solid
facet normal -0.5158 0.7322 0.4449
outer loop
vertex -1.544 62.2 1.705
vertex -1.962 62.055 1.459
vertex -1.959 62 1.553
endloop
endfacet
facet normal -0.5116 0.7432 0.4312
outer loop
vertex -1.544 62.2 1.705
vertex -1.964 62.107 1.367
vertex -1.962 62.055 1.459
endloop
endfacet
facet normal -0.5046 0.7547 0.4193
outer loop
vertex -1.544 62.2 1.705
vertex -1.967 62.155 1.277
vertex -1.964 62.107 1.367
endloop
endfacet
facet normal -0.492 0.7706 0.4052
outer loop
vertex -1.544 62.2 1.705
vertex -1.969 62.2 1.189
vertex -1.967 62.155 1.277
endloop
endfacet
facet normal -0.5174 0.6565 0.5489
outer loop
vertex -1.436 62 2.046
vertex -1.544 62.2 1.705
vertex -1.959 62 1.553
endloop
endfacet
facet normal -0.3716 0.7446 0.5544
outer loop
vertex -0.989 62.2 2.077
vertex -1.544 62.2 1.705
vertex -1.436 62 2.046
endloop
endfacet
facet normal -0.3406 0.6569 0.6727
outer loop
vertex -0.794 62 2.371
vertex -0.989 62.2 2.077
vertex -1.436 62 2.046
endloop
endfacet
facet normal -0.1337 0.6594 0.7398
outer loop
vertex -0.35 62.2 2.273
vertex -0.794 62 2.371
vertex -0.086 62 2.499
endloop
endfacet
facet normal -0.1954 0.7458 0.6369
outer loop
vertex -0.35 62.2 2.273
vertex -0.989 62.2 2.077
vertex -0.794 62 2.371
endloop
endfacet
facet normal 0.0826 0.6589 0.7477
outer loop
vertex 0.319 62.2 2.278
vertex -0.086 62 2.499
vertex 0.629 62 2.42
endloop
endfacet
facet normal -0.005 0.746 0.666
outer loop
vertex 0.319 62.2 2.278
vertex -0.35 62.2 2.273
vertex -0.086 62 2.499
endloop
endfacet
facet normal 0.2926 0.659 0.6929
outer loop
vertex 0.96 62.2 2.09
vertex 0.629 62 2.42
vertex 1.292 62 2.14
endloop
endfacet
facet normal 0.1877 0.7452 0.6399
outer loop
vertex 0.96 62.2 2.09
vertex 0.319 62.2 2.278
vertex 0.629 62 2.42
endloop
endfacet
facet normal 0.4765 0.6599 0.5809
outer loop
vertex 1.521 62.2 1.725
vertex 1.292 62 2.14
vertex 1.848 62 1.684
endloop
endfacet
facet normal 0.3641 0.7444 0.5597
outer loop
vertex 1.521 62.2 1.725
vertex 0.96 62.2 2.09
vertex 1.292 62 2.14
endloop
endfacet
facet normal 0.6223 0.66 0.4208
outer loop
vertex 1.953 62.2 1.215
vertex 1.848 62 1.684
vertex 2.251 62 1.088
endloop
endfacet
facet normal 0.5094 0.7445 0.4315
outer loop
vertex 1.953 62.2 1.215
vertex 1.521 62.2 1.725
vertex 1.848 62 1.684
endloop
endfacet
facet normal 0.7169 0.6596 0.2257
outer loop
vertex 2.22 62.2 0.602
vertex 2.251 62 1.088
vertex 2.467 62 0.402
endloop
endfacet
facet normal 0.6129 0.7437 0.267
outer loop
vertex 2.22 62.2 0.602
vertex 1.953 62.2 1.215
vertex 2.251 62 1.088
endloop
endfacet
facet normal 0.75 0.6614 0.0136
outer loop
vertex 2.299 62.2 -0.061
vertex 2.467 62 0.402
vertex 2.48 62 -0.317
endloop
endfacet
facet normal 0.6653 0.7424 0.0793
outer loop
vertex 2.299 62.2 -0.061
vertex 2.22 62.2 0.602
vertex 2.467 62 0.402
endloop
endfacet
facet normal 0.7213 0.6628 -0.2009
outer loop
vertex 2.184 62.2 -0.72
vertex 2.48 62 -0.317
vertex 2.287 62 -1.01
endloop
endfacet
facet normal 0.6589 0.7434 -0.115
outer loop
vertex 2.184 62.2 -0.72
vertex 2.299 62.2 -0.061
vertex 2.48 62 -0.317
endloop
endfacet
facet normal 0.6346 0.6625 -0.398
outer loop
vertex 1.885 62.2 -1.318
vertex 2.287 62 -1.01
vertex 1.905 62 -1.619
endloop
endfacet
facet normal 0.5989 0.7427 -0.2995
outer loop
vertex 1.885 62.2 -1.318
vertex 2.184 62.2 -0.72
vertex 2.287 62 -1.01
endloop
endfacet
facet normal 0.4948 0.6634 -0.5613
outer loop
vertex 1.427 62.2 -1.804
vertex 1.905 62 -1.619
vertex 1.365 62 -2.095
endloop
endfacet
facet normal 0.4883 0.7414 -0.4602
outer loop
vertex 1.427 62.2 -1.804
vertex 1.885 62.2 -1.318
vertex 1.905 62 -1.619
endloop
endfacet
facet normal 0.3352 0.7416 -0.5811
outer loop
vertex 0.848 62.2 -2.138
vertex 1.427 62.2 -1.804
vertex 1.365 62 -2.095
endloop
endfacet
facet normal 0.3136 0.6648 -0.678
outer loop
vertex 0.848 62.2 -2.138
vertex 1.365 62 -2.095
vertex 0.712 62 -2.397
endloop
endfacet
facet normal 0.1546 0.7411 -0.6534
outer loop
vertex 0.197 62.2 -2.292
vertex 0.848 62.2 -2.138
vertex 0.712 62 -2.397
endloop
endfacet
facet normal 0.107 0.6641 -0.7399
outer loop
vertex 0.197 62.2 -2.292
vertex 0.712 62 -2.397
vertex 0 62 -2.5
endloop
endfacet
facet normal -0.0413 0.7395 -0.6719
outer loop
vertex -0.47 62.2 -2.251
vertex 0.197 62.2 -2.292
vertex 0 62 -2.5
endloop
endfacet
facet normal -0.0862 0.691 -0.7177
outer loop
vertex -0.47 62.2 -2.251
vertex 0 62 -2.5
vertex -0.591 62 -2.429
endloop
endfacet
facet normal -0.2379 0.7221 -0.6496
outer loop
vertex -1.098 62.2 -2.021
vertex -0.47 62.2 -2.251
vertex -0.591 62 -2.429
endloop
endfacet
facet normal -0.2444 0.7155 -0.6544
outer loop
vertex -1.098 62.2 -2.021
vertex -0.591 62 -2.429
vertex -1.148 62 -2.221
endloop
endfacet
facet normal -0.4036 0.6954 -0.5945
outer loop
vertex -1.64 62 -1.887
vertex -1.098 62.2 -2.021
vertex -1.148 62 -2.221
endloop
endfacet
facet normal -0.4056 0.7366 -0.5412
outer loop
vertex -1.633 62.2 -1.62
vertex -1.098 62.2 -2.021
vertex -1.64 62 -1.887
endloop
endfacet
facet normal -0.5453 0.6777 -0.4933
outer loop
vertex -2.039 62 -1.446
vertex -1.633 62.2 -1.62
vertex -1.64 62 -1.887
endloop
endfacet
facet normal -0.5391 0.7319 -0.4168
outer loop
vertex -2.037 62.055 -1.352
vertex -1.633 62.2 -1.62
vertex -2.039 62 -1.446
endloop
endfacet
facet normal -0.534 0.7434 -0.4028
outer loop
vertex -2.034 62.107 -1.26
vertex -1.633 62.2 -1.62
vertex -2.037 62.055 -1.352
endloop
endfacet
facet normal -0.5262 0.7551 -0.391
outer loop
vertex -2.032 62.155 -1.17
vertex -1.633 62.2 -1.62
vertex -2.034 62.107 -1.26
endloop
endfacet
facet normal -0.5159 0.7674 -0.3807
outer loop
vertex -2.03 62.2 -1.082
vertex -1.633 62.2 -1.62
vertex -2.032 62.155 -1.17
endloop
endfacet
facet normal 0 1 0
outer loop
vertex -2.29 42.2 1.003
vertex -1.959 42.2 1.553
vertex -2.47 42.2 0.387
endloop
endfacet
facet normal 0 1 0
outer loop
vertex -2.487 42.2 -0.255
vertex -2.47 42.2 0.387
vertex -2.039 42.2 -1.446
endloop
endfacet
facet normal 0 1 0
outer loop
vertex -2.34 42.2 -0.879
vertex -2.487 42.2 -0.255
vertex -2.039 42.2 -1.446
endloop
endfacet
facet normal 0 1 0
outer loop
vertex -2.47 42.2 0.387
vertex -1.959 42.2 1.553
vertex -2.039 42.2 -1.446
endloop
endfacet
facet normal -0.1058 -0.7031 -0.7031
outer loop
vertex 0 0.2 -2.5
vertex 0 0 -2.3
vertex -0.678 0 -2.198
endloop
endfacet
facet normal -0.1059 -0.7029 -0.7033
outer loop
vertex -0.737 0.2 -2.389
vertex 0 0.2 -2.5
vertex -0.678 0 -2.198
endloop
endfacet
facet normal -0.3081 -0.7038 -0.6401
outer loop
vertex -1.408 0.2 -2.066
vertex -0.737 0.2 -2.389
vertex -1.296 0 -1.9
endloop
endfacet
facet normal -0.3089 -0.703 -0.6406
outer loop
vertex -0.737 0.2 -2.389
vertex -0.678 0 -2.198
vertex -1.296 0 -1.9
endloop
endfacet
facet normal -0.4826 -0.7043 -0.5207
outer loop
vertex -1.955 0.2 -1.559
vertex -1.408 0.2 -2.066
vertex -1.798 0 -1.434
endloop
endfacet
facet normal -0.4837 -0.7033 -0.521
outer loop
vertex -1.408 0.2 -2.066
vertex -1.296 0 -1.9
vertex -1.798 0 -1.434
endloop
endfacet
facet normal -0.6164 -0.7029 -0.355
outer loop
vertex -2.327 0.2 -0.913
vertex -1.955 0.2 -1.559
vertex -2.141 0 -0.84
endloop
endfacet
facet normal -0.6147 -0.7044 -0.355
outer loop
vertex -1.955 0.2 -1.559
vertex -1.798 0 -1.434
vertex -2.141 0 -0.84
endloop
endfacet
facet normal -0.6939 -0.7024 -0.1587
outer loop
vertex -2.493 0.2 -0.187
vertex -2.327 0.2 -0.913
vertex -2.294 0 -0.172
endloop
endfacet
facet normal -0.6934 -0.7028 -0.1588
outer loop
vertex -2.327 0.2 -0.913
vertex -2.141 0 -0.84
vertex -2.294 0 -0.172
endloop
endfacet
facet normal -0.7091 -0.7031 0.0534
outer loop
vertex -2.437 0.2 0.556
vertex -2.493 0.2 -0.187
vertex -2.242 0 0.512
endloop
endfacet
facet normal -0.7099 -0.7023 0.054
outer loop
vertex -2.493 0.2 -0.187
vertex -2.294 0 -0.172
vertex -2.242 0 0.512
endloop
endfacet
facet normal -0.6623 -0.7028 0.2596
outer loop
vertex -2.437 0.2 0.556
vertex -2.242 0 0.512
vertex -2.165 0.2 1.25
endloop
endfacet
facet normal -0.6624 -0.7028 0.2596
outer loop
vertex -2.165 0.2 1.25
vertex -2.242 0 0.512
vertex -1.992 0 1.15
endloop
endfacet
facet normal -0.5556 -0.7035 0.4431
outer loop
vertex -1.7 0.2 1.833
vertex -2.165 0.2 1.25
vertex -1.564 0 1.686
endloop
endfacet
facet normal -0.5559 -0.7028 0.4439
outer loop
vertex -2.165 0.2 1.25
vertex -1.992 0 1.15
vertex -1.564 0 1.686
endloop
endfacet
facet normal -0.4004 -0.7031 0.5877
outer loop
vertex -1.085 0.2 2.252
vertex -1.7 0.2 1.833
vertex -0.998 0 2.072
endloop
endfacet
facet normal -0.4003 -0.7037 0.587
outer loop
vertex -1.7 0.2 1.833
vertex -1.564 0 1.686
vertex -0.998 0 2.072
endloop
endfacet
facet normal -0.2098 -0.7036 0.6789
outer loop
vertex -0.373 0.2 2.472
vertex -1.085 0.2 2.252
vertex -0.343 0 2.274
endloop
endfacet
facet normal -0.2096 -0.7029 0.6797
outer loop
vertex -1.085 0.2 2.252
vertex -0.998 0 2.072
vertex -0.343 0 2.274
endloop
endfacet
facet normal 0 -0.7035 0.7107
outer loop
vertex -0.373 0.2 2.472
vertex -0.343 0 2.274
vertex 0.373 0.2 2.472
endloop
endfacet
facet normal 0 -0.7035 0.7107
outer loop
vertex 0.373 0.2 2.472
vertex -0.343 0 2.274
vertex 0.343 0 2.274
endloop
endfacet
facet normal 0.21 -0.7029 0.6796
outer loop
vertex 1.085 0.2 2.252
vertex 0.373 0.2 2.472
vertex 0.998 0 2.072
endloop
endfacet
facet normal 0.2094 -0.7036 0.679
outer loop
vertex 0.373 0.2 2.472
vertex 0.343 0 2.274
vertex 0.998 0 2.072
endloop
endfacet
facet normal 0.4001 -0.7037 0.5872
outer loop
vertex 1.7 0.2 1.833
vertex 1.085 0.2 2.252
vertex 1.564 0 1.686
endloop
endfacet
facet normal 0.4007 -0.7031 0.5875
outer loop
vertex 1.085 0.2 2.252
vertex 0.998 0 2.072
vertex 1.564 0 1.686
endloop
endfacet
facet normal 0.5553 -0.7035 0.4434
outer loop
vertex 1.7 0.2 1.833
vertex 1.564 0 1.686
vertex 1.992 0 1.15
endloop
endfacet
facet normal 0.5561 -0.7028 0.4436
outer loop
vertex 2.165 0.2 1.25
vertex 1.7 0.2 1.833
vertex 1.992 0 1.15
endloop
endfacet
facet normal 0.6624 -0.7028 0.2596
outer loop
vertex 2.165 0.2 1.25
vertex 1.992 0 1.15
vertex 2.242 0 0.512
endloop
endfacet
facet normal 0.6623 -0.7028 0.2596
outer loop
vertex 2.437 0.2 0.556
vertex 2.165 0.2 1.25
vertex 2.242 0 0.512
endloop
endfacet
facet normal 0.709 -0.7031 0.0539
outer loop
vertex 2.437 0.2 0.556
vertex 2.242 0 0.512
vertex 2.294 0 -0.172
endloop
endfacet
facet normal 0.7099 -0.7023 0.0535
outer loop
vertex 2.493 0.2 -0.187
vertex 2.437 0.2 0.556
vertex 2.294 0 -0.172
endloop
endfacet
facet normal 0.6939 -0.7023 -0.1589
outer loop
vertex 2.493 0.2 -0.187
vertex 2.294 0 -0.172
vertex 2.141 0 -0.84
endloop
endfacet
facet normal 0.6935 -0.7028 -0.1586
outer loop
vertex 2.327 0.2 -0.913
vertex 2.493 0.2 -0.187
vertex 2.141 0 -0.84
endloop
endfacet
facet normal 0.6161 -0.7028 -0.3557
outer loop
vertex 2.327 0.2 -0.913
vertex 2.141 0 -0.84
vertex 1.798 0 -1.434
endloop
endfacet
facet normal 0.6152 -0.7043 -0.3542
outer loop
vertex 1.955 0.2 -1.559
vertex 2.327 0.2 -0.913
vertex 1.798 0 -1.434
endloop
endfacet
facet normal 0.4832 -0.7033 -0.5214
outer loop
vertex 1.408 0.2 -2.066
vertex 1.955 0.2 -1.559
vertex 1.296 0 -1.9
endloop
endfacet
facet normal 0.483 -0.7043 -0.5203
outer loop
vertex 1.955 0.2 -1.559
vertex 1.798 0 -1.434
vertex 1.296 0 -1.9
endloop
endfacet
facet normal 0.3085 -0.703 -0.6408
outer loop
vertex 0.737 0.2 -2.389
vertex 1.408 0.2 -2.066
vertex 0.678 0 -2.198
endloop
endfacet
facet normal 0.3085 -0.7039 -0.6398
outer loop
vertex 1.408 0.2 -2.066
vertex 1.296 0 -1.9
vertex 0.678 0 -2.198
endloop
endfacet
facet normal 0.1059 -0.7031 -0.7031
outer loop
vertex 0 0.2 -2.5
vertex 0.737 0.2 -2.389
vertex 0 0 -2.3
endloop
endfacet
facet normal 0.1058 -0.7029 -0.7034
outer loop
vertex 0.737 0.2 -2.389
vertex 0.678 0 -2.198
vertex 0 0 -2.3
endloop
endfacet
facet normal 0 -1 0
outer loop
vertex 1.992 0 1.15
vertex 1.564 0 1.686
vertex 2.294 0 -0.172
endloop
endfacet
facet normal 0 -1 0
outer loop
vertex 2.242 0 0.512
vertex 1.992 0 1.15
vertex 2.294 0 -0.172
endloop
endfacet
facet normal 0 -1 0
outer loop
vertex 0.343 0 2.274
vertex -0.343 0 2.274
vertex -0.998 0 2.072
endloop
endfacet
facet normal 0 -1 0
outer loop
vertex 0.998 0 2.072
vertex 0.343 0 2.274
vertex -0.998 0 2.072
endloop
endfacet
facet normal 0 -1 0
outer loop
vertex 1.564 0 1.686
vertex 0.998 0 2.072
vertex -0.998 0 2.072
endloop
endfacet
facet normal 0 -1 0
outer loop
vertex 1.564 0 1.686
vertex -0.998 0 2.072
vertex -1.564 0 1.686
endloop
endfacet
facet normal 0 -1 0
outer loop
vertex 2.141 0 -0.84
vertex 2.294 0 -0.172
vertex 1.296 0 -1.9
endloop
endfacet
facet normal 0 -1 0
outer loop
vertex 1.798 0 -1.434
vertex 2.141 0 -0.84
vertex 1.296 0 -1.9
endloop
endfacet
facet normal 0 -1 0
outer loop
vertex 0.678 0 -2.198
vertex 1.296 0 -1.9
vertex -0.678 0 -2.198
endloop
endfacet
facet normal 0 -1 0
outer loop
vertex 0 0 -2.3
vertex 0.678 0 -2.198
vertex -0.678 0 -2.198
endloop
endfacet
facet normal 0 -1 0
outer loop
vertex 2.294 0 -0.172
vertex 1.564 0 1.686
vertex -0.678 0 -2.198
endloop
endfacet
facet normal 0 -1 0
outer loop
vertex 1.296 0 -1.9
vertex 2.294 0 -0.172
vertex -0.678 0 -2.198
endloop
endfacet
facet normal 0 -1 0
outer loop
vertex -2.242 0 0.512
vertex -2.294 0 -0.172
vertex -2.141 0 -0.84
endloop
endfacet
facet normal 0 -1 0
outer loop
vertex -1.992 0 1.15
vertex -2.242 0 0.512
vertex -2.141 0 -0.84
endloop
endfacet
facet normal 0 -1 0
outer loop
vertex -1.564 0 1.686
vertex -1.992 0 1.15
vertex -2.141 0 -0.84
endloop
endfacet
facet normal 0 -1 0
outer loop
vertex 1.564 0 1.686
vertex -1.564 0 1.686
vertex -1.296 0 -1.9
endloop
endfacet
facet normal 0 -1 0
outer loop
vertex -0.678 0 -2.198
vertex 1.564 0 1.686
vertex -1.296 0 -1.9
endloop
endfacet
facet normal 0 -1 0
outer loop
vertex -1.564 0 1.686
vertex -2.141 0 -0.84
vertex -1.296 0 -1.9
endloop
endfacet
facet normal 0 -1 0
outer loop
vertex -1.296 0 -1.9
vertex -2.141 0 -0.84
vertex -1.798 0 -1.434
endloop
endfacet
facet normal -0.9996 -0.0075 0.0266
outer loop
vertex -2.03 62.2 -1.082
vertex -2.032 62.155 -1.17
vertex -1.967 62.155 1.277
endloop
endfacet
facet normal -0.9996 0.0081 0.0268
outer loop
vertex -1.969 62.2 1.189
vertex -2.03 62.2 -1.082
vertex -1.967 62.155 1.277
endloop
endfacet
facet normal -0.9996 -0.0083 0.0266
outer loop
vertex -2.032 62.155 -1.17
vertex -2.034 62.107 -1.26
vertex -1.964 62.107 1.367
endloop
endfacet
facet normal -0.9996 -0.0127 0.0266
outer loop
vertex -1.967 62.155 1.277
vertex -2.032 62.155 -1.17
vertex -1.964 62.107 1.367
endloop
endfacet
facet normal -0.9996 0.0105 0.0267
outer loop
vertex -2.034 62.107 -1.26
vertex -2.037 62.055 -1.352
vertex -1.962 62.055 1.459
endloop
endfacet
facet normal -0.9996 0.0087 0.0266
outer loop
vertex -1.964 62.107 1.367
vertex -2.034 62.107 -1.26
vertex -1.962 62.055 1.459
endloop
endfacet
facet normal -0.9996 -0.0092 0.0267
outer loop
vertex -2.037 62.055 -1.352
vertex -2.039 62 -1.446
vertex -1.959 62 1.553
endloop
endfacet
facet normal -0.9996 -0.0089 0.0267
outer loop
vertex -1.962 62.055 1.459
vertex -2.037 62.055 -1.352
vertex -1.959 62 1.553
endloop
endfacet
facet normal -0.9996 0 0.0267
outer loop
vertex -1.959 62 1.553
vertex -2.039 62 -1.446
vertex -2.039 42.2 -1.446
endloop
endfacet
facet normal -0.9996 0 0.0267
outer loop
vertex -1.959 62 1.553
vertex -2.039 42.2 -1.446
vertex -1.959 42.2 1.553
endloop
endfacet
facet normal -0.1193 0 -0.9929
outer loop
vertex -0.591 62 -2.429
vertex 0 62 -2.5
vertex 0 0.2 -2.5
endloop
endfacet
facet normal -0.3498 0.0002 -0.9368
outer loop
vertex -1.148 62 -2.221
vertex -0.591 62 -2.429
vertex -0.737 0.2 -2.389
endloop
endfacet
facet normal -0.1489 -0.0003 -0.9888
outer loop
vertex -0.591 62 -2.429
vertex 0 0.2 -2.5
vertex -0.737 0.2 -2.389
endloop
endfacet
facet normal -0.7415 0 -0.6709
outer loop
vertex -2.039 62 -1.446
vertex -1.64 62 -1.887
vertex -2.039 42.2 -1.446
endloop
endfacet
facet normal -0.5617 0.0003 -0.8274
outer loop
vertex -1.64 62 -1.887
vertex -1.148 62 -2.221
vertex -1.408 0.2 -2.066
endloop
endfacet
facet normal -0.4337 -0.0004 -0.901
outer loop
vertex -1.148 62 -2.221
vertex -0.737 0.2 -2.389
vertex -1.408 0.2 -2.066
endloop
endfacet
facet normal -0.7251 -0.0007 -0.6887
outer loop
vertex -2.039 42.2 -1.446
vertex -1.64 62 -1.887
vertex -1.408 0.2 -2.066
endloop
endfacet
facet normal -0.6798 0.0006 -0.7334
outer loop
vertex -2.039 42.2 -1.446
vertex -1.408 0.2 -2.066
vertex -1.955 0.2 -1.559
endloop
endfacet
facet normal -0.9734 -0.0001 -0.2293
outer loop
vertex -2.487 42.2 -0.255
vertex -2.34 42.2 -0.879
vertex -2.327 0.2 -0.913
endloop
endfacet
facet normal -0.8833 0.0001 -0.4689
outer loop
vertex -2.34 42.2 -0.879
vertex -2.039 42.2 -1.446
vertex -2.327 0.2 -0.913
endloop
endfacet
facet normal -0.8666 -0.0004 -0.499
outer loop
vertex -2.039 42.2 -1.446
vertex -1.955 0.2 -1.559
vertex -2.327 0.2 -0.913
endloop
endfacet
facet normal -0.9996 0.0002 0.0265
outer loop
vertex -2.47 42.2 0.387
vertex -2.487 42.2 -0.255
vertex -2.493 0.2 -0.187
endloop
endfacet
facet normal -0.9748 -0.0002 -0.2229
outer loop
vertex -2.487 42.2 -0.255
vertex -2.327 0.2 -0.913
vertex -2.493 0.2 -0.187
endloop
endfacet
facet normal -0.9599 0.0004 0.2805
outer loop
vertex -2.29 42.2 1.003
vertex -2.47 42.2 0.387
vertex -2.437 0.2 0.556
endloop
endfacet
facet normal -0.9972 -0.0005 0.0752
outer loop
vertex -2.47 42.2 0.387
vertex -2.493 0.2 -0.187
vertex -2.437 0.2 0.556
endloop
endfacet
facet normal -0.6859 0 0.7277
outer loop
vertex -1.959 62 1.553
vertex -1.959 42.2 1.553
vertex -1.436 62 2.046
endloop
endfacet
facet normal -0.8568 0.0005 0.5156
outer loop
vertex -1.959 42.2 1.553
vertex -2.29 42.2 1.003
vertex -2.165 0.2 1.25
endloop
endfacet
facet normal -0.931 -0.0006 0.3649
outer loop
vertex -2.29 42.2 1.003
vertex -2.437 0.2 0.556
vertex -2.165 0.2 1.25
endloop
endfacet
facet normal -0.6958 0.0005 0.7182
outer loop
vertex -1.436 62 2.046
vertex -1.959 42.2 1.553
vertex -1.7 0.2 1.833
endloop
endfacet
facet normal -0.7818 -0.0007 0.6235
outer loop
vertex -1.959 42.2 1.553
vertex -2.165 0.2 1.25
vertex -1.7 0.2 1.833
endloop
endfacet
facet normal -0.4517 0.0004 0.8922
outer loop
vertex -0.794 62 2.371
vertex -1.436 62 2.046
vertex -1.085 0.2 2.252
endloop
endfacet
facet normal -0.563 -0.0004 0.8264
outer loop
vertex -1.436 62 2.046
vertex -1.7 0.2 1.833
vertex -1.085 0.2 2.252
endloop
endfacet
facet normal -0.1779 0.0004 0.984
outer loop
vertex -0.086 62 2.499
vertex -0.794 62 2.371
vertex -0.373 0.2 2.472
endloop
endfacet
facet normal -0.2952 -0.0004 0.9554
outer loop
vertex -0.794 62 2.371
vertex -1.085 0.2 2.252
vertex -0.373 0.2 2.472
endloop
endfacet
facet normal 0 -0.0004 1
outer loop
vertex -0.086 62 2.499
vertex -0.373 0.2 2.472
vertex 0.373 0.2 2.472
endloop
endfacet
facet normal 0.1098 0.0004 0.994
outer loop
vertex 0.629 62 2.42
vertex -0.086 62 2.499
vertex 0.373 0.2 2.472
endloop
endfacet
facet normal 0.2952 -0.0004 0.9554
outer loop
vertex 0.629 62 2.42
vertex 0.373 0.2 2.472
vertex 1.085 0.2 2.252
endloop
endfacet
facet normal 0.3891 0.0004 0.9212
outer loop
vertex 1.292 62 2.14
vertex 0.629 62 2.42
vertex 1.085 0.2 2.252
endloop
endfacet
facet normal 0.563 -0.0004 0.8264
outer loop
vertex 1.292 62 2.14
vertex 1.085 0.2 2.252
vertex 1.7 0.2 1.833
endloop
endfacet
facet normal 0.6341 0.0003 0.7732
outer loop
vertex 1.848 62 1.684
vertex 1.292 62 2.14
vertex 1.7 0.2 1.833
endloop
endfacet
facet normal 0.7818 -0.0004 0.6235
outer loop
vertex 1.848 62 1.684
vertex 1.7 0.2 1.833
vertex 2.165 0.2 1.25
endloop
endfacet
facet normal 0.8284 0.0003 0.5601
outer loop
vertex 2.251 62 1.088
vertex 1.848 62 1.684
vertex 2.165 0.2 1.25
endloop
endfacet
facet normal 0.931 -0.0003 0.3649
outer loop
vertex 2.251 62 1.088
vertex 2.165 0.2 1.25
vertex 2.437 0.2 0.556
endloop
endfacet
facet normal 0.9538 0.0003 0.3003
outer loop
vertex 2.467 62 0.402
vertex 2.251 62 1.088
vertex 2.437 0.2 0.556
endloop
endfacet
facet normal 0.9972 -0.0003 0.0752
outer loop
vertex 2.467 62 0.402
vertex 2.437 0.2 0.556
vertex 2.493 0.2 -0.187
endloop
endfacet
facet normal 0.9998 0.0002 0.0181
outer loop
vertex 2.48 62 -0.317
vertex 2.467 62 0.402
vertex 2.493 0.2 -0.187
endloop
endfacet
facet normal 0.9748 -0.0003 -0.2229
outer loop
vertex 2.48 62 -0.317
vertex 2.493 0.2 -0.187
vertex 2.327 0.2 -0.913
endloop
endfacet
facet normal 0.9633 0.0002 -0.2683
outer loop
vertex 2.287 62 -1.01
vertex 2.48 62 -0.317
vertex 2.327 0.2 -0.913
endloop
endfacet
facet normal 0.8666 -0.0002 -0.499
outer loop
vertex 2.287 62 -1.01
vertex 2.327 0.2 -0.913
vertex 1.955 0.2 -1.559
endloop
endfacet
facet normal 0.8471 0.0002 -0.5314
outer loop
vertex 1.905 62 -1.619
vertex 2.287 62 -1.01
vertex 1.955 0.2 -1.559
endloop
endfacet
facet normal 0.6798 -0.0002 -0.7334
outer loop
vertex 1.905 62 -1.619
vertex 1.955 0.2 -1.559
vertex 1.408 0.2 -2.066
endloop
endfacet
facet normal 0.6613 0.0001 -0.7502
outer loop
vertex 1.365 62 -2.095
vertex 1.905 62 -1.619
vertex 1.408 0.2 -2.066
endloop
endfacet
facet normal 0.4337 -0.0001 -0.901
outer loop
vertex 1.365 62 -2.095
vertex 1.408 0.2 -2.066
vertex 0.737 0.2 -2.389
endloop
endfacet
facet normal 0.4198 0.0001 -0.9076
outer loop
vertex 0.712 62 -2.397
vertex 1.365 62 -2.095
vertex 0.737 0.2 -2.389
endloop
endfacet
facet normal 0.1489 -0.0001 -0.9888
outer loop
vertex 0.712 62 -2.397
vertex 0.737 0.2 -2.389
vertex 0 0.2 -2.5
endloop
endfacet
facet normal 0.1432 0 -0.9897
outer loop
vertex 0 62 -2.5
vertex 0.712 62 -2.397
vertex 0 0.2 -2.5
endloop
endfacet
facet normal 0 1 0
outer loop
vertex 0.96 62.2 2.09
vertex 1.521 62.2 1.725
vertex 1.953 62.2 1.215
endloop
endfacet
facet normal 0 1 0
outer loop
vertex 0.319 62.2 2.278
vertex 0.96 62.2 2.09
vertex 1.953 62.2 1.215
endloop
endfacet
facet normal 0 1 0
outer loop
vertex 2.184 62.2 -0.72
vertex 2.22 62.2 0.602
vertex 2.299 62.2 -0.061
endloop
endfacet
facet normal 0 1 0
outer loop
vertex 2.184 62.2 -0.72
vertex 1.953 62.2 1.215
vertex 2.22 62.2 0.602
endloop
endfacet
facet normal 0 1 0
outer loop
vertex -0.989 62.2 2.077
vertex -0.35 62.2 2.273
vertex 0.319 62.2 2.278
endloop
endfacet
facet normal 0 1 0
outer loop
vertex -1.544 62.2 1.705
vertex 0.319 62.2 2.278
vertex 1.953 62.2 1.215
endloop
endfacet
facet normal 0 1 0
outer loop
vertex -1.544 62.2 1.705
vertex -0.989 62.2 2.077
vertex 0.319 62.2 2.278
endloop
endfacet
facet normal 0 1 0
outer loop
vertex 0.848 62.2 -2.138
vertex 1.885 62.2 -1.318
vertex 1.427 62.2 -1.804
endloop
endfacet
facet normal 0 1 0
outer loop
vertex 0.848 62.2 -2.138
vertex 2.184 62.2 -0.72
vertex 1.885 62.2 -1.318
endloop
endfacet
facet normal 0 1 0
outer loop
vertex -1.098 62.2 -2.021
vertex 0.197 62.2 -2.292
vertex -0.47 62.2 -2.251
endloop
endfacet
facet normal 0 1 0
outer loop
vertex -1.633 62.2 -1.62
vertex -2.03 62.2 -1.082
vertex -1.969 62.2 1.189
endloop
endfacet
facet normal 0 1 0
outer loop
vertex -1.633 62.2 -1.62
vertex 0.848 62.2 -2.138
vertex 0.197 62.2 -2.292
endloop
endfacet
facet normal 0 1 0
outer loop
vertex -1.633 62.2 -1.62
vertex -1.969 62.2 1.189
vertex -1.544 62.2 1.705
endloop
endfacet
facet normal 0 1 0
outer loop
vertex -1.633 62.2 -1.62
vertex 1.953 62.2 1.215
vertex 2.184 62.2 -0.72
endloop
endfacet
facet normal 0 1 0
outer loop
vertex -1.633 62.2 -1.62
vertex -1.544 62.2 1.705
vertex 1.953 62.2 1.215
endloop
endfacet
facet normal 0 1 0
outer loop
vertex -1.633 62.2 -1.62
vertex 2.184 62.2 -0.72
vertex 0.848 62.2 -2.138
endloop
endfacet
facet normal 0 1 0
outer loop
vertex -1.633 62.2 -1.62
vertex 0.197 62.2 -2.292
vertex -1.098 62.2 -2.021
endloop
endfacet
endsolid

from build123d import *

# Parameters (mm, degrees)
SKETCH1_R               = 2.5
BOSS_EXTRUDE1_DEPTH     = 62.2
CUT_EXTRUDE1_DEPTH      = 63.300401283
CUT_EXTRUDE1_DEPTH_BACK = 20
CHAMFER1_SIZE           = 0.2
CHAMFER2_SIZE           = 0.2


with BuildPart() as part:
    # Sketch1 → Boss-Extrude1 (new body)
    with BuildSketch(Plane(origin=(0, 0, 0), x_dir=(1, 0, 0), z_dir=(0, 1, 0))):
        with Locations(Location((0, 0, 0), (0, 0, 90))):
            Circle(SKETCH1_R)
    extrude(amount=BOSS_EXTRUDE1_DEPTH)

    # Sketch2 → Cut-Extrude1 (cut, two sides: drawn at the far end of the back side and taken through both)
    with BuildSketch(Plane(origin=(0, 62.2, 0), x_dir=(1, 0, 0), z_dir=(0, 1, 0)).offset(-CUT_EXTRUDE1_DEPTH_BACK)):
        with BuildLine():
            Line((-2.039291674, 1.446129132), (-1.959285636, -1.55280385))
            ThreePointArc((-1.959285636, -1.55280385), (-2.499110819, -0.066671699), (-2.039291674, 1.446129132))
        make_face()
    extrude(amount=CUT_EXTRUDE1_DEPTH + CUT_EXTRUDE1_DEPTH_BACK, mode=Mode.SUBTRACT)

    # Chamfer1
    chamfer1_edges = [part.edges().sort_by_distance(p)[0] for p in [
        (2.250778713, 62.2, 1.088115429),
    ]]
    chamfer(chamfer1_edges, length=CHAMFER1_SIZE)

    # Chamfer2
    chamfer2_edges = [part.edges().sort_by_distance(p)[0] for p in [
        (0, 0, 2.5),
    ]]
    chamfer(chamfer2_edges, length=CHAMFER2_SIZE)


solid = part.part
